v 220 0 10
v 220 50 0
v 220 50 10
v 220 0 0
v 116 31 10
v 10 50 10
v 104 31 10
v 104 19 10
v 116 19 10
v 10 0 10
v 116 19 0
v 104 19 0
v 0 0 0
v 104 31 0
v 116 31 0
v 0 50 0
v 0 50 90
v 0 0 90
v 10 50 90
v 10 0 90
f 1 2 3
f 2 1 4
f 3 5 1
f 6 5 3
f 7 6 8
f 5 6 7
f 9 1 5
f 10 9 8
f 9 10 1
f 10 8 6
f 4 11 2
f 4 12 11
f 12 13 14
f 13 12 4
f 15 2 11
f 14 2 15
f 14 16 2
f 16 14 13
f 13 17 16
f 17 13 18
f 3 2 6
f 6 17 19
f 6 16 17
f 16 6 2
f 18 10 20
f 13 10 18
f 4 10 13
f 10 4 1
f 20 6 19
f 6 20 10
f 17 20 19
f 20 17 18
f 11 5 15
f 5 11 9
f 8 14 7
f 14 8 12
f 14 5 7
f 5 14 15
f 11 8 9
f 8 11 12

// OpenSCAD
$fn = 32;

// ----------------------------------------------------------------------
// Gantry bracket: 200-250 mm L bracket
// ----------------------------------------------------------------------

// --- parameters (mm) ---
base_l = 220;             // base arm length, X
arm_w = 50;               // arm width, Y
thick = 10;               // arm thickness
up_h = 80;                // vertical arm height, Z
slot_w = 12;              // adjustment slot width in the base

total_h = up_h + thick;  // overall height

difference() {
  union() {
    cube([base_l, arm_w, thick]);
    cube([thick, arm_w, total_h]);
  }
  translate([base_l / 2 - slot_w / 2, arm_w / 2 - slot_w / 2, -1])
    cube([slot_w, slot_w, thick + 2]);
}
